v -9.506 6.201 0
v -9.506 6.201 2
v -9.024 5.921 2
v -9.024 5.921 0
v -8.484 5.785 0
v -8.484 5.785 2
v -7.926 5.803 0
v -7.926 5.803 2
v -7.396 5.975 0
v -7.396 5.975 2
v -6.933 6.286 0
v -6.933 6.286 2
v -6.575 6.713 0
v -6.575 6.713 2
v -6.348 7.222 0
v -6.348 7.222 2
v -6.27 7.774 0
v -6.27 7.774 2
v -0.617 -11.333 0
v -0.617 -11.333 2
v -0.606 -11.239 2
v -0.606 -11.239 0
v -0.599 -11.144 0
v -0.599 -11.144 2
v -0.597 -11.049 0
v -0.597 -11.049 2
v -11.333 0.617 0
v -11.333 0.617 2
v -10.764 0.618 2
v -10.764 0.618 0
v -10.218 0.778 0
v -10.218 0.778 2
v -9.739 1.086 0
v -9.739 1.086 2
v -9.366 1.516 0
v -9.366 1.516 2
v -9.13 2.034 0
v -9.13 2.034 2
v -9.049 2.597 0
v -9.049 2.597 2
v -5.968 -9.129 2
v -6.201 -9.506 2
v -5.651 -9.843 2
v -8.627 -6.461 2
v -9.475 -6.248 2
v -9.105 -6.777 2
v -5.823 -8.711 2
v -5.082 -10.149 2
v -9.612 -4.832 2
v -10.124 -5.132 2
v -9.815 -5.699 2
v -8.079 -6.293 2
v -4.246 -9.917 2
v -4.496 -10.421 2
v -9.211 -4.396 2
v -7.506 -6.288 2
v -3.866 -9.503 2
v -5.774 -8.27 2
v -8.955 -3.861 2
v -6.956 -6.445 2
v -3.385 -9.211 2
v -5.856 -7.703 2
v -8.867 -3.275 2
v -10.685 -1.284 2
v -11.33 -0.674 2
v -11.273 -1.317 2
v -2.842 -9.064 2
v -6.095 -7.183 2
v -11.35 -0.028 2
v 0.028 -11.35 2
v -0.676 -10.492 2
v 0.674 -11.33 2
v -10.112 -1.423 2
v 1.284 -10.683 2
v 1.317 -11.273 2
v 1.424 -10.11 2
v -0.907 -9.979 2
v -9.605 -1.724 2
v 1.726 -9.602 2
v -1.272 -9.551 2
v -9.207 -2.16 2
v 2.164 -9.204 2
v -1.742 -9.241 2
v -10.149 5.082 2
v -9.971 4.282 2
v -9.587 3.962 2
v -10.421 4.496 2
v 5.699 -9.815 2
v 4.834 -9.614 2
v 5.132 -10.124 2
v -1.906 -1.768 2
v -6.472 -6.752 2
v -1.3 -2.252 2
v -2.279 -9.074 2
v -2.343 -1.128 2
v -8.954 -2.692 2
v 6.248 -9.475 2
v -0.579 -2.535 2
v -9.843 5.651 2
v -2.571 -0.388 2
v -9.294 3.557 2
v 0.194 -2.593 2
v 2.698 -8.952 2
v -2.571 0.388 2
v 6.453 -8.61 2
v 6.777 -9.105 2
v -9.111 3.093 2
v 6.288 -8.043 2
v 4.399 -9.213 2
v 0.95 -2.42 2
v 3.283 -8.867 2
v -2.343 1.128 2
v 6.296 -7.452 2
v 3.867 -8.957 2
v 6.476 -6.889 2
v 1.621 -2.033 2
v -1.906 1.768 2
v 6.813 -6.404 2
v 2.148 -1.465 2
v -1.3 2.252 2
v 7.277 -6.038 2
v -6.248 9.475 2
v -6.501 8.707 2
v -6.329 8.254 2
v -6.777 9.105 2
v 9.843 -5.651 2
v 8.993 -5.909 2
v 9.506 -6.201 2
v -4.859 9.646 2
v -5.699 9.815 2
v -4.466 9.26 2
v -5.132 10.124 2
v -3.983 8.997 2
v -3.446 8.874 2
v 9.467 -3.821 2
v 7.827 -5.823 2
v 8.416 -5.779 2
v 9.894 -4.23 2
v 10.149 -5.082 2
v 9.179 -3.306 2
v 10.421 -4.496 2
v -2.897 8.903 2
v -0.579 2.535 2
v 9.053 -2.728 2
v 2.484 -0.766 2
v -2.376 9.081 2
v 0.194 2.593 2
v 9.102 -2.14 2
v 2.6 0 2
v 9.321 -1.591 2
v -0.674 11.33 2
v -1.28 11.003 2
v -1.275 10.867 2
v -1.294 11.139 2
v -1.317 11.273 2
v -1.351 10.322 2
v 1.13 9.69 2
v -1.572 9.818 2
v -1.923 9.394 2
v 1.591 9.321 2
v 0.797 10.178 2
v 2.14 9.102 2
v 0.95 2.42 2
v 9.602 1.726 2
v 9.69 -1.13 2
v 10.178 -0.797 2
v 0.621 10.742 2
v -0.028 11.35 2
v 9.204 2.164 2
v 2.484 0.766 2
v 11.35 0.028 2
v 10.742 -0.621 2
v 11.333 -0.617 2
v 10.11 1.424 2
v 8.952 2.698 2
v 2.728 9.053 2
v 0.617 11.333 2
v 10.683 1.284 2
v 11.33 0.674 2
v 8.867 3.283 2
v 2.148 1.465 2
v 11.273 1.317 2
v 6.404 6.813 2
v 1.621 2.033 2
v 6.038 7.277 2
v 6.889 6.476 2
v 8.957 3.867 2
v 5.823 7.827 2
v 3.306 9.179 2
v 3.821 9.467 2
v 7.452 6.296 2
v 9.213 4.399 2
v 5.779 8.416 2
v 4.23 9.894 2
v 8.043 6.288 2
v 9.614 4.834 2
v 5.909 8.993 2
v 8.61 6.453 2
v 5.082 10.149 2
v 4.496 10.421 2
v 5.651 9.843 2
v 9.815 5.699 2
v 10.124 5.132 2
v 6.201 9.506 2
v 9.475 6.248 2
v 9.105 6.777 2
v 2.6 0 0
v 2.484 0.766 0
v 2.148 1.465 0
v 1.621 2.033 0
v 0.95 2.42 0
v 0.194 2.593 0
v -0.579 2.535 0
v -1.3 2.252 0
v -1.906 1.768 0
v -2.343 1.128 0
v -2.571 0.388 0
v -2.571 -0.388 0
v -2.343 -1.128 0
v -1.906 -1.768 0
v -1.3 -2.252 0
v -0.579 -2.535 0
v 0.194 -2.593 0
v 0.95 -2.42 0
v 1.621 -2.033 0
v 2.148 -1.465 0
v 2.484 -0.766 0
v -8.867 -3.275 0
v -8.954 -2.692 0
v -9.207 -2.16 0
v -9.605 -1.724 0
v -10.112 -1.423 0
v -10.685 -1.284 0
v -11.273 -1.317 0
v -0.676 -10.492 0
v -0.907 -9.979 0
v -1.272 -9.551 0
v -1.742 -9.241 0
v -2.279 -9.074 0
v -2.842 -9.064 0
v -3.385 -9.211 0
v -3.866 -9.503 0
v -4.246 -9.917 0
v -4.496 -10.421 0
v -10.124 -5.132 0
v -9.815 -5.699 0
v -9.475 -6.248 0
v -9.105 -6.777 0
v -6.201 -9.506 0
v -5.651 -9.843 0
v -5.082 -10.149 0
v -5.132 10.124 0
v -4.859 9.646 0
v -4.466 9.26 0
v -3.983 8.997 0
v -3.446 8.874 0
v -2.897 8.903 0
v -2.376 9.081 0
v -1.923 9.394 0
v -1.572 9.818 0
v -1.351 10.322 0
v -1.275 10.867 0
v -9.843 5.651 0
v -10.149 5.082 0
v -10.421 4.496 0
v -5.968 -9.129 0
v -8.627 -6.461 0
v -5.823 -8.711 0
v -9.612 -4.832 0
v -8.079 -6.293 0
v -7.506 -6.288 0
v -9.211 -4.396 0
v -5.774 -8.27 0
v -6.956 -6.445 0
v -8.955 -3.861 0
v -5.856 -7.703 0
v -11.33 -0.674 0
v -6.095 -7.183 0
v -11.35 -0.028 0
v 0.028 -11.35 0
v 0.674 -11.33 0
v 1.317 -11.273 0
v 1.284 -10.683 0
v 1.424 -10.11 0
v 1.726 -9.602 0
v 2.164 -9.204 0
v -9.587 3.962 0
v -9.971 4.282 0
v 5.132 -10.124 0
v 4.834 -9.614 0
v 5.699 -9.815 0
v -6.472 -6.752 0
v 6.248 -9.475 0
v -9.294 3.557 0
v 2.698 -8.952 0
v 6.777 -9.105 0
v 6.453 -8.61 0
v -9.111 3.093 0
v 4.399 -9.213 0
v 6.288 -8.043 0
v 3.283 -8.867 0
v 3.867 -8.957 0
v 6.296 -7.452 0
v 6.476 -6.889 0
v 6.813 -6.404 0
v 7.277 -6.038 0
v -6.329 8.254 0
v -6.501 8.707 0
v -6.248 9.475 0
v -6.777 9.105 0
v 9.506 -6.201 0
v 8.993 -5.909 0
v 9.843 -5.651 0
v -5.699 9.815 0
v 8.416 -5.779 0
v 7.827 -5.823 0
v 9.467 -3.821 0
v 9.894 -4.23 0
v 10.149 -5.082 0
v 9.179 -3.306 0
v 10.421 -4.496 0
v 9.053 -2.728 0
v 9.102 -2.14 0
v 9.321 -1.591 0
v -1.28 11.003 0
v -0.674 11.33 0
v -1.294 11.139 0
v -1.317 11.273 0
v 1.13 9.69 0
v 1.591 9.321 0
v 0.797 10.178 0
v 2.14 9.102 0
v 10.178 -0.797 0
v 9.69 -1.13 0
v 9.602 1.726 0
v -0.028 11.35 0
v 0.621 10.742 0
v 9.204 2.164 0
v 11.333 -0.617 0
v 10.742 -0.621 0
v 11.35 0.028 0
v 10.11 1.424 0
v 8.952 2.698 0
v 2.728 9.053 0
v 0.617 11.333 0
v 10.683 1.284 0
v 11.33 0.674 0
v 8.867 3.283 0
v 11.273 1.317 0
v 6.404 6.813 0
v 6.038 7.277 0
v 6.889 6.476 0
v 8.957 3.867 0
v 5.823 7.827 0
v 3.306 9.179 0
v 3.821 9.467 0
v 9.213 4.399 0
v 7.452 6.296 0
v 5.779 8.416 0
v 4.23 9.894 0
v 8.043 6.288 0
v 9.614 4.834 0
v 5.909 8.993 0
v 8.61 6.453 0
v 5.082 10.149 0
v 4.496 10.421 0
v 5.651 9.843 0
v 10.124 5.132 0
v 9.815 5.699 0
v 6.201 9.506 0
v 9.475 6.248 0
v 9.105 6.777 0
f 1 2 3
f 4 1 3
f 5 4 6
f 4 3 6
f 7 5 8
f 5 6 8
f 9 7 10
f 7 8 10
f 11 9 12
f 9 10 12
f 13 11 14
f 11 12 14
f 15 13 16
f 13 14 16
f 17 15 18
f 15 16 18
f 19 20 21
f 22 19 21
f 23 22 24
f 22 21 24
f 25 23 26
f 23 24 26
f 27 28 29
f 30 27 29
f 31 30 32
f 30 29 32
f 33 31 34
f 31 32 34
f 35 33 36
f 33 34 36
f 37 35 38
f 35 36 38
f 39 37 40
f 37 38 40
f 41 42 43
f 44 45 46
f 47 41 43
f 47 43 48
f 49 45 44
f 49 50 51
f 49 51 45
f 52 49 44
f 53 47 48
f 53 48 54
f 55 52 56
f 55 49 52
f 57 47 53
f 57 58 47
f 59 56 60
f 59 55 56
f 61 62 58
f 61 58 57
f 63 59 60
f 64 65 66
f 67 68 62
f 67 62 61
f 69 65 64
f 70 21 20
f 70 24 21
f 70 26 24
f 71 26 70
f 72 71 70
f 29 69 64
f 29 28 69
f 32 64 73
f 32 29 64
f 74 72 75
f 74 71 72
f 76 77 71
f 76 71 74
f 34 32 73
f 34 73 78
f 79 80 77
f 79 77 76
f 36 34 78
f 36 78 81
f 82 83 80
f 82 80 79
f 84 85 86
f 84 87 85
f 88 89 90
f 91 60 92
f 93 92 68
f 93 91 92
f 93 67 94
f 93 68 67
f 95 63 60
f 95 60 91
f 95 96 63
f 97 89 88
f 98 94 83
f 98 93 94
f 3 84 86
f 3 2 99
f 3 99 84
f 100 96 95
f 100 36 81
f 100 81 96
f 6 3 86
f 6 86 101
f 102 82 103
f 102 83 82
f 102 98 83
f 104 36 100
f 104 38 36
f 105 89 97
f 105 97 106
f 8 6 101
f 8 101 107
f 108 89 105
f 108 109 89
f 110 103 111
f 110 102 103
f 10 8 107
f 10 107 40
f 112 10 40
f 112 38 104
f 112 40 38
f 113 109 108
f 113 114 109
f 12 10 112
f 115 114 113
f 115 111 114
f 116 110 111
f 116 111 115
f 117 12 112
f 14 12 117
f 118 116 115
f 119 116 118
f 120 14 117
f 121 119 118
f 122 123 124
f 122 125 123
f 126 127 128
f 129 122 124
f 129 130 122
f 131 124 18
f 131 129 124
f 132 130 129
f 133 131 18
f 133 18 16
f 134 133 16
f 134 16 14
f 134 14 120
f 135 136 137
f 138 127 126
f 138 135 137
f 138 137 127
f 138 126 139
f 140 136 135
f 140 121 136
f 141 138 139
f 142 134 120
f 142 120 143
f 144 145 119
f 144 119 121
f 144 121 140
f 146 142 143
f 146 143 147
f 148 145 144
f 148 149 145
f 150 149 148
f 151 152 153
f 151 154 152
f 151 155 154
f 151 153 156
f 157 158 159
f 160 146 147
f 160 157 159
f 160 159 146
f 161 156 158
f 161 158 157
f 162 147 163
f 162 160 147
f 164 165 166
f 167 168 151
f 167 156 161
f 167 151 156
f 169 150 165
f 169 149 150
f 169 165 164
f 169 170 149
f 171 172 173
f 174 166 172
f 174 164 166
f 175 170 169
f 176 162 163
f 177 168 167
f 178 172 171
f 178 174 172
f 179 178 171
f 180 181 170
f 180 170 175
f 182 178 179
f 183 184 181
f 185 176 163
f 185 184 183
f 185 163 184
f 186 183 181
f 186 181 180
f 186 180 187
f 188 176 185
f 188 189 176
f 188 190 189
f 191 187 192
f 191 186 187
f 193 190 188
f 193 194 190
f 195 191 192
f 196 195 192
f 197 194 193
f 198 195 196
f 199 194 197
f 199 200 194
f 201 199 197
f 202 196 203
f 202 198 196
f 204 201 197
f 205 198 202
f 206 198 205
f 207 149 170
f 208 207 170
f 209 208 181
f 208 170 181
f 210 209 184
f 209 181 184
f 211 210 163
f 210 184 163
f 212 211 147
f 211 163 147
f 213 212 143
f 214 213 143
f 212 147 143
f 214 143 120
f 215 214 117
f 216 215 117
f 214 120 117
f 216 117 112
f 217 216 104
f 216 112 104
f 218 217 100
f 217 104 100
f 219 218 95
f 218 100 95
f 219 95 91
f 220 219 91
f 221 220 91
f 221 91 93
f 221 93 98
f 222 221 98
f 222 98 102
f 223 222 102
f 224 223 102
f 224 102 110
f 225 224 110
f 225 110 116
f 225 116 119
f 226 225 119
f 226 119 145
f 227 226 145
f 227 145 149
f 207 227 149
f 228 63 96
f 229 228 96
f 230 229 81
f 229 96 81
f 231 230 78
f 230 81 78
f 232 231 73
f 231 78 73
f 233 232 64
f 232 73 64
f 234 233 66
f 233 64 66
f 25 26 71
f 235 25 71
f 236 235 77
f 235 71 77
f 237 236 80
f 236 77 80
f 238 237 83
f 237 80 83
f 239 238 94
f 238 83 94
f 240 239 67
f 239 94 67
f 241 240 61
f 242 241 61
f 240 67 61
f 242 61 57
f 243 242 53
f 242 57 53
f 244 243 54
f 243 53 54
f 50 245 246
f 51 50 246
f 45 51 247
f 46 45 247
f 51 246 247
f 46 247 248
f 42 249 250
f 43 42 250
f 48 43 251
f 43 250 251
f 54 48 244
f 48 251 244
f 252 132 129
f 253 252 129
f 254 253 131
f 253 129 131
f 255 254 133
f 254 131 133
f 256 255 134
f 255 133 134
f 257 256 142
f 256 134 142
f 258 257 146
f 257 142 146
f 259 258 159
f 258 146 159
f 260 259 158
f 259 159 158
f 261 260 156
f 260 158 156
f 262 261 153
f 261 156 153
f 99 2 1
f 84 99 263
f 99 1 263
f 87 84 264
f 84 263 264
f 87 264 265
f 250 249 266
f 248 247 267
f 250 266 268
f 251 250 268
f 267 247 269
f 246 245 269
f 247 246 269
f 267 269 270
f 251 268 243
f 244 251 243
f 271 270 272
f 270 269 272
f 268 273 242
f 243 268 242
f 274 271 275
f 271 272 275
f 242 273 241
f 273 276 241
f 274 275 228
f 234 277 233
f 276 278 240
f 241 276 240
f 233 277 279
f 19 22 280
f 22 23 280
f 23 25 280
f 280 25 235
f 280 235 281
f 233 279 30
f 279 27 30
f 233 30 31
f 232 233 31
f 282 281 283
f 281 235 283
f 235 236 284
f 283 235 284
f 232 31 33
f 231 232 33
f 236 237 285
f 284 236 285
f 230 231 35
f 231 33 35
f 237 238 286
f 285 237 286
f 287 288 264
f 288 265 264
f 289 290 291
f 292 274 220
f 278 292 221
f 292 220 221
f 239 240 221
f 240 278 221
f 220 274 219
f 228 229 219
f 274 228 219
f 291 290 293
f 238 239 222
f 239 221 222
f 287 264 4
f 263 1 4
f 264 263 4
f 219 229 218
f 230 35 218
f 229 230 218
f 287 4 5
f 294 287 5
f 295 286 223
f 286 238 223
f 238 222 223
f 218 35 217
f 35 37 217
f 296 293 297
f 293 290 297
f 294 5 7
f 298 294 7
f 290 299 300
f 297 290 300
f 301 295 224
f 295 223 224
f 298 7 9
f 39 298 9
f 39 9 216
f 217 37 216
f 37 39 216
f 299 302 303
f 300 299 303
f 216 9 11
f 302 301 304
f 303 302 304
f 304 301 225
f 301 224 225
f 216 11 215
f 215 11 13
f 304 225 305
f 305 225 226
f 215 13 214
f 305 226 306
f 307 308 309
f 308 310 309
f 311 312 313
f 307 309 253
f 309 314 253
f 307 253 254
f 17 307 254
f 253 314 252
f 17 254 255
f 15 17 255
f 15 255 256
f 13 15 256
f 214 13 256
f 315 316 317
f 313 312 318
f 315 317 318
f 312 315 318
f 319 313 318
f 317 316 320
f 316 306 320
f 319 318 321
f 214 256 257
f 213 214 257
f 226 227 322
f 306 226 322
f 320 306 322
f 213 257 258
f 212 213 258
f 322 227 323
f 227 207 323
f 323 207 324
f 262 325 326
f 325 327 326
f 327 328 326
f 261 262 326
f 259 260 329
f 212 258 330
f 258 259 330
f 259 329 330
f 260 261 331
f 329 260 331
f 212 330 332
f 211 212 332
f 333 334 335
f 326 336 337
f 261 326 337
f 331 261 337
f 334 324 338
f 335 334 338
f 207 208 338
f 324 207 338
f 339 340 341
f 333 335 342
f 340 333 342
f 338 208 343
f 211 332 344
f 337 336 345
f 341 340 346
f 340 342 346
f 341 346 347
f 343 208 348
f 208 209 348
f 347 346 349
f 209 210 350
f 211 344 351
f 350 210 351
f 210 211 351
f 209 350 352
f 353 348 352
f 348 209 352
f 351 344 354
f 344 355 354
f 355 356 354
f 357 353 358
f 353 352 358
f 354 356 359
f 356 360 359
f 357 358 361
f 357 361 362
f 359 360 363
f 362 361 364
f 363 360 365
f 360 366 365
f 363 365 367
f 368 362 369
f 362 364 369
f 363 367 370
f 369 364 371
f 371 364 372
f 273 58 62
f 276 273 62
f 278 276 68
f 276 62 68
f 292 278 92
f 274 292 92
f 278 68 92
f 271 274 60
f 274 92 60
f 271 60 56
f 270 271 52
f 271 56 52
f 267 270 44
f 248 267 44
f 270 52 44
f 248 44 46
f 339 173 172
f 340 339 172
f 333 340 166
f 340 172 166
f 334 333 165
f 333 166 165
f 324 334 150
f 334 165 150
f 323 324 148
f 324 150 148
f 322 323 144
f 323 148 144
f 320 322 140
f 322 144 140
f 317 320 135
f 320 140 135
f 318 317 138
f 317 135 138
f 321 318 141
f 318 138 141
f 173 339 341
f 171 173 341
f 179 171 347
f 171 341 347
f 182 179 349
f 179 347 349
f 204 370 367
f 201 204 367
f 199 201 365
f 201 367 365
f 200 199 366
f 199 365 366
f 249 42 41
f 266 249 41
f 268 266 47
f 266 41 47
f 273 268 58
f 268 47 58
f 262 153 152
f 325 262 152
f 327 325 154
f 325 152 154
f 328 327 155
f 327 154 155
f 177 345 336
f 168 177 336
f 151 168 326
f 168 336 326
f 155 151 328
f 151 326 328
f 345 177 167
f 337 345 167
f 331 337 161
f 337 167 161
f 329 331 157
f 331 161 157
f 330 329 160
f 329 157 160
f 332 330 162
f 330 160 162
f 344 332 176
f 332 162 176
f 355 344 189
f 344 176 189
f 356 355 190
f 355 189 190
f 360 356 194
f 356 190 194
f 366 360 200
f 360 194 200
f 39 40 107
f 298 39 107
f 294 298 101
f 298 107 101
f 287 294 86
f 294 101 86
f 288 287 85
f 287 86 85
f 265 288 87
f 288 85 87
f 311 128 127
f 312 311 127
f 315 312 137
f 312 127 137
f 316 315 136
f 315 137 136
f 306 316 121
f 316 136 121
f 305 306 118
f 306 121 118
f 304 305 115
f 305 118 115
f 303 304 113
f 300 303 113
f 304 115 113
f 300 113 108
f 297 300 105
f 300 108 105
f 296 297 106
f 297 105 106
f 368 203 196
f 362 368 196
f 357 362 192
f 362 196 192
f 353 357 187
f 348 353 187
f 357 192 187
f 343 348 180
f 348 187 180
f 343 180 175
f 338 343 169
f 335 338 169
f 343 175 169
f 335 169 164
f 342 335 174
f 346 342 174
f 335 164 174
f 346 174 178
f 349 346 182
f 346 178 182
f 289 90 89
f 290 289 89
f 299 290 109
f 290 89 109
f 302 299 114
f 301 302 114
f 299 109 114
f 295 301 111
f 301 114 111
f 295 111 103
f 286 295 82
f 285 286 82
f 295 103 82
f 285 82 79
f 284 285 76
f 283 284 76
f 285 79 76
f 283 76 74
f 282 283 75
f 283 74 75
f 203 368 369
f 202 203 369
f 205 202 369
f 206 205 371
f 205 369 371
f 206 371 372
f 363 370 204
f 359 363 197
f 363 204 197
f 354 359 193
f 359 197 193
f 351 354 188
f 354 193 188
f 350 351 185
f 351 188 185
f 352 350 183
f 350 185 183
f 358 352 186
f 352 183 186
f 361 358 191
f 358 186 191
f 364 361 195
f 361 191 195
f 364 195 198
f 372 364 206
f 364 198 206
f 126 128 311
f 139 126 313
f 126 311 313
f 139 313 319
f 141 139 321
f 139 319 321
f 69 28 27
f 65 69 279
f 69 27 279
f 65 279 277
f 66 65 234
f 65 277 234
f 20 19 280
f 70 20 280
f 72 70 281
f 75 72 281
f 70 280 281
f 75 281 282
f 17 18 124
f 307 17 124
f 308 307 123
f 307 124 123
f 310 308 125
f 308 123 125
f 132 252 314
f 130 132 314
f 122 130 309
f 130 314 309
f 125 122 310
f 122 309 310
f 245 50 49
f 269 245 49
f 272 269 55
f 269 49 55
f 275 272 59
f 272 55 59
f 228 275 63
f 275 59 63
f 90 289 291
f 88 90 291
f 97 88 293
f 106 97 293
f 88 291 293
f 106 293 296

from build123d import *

# Parameters (mm, degrees)
F0_R     = 11.35
F1_DEPTH = 2
F2_R     = 2.6
F3_DEPTH = 25


# Not quite as in the source:
# - a feature names something its author has since deleted; it is built from what else it names


with BuildPart() as f1:
    # F0 (on Top) → F1 (new body)
    with BuildSketch(Plane.XY):
        Circle(F0_R)
    extrude(amount=F1_DEPTH)

    # F2 (on face) → F3 (cut)
    with BuildSketch(Plane.XY.offset(2)):
        with BuildLine():
            ThreePointArc((9.1045560576, 6.7771350137), (7.7736409673, 8.2700064155), (6.2013506213, 9.506090178))
            ThreePointArc((6.2013506213, 9.506090178), (6.4038363916, 6.8127365625), (9.1045560576, 6.7771350137))
        make_face()
        with BuildLine():
            ThreePointArc((9.1045560576, 6.7771350137), (9.5987204424, 7.4520303097), (9.7736409673, 8.2700064155))
            ThreePointArc((9.7736409673, 8.2700064155), (8.4276361156, 10.1600567709), (6.2013506213, 9.506090178))
            ThreePointArc((6.2013506213, 9.506090178), (7.7736409673, 8.2700064155), (9.1045560576, 6.7771350137))
        make_face()
        with BuildLine():
            ThreePointArc((0.6174820868, 11.3331908954), (2.1395167155, 9.1019211282), (4.4962093293, 10.4214491155))
            ThreePointArc((4.4962093293, 10.4214491155), (2.5971673498, 11.0488561289), (0.6174820868, 11.3331908954))
        make_face()
        with BuildLine():
            ThreePointArc((0.6174820868, 11.3331908954), (2.5971673498, 11.0488561289), (4.4962093293, 10.4214491155))
            ThreePointArc((4.4962093293, 10.4214491155), (4.5717665445, 10.73111721), (4.5971673498, 11.0488561289))
            ThreePointArc((4.5971673498, 11.0488561289), (2.7396971257, 13.04377098), (0.6174820868, 11.3331908954))
        make_face()
        with BuildLine():
            ThreePointArc((-5.1318402741, 10.1235722648), (-3.2752151616, 10.8671737653), (-1.3168930579, 11.2733443429))
            ThreePointArc((-1.3168930579, 11.2733443429), (-3.8523455866, 12.7820942526), (-5.1318402741, 10.1235722648))
        make_face()
        with BuildLine():
            ThreePointArc((-1.2752151616, 10.8671737653), (-1.2856619194, 11.0713254155), (-1.3168930579, 11.2733443429))
            ThreePointArc((-1.3168930579, 11.2733443429), (-3.2752151616, 10.8671737653), (-5.1318402741, 10.1235722648))
            ThreePointArc((-5.1318402741, 10.1235722648), (-2.8965663963, 8.9033445689), (-1.2752151616, 10.8671737653))
        make_face()
        with BuildLine():
            ThreePointArc((-9.506090178, 6.2013506213), (-8.2700064155, 7.7736409673), (-6.7771350137, 9.1045560576))
            ThreePointArc((-6.7771350137, 9.1045560576), (-9.7272762684, 9.143445543), (-9.506090178, 6.2013506213))
        make_face()
        with BuildLine():
            ThreePointArc((-6.2700064155, 7.7736409673), (-6.4010838912, 8.4857705891), (-6.7771350137, 9.1045560576))
            ThreePointArc((-6.7771350137, 9.1045560576), (-8.2700064155, 7.7736409673), (-9.506090178, 6.2013506213))
            ThreePointArc((-9.506090178, 6.2013506213), (-7.3959833966, 5.97472914), (-6.2700064155, 7.7736409673))
        make_face()
        with BuildLine():
            ThreePointArc((-11.3331908954, 0.6174820868), (-11.0488561289, 2.5971673498), (-10.4214491155, 4.4962093293))
            ThreePointArc((-10.4214491155, 4.4962093293), (-12.9957911296, 3.0548179842), (-11.3331908954, 0.6174820868))
        make_face()
        with BuildLine():
            ThreePointArc((-9.0488561289, 2.5971673498), (-9.427928304, 3.7687444863), (-10.4214491155, 4.4962093293))
            ThreePointArc((-10.4214491155, 4.4962093293), (-11.0488561289, 2.5971673498), (-11.3331908954, 0.6174820868))
            ThreePointArc((-11.3331908954, 0.6174820868), (-9.7390220808, 1.0857657597), (-9.0488561289, 2.5971673498))
        make_face()
        with BuildLine():
            ThreePointArc((11.2733443429, 1.3168930579), (10.8671737653, 3.2752151616), (10.1235722648, 5.1318402741))
            ThreePointArc((10.1235722648, 5.1318402741), (8.952253278, 2.6980847366), (11.2733443429, 1.3168930579))
        make_face()
        with BuildLine():
            ThreePointArc((12.8671737653, 3.2752151616), (11.9880655975, 4.9315972131), (10.1235722648, 5.1318402741))
            ThreePointArc((10.1235722648, 5.1318402741), (10.8671737653, 3.2752151616), (11.2733443429, 1.3168930579))
            ThreePointArc((11.2733443429, 1.3168930579), (12.4183573707, 2.0127455887), (12.8671737653, 3.2752151616))
        make_face()
        with BuildLine():
            ThreePointArc((10.4214491155, -4.4962093293), (11.0488561289, -2.5971673498), (11.3331908954, -0.6174820868))
            ThreePointArc((11.3331908954, -0.6174820868), (9.1019211282, -2.1395167155), (10.4214491155, -4.4962093293))
        make_face()
        with BuildLine():
            ThreePointArc((13.0488561289, -2.5971673498), (12.560257719, -1.2873333018), (11.3331908954, -0.6174820868))
            ThreePointArc((11.3331908954, -0.6174820868), (11.0488561289, -2.5971673498), (10.4214491155, -4.4962093293))
            ThreePointArc((10.4214491155, -4.4962093293), (12.2204332653, -4.2180951747), (13.0488561289, -2.5971673498))
        make_face()
        with BuildLine():
            ThreePointArc((-4.4962093293, -10.4214491155), (-3.0548179842, -12.9957911296), (-0.6174820868, -11.3331908954))
            ThreePointArc((-0.6174820868, -11.3331908954), (-2.5971673498, -11.0488561289), (-4.4962093293, -10.4214491155))
        make_face()
        with BuildLine():
            ThreePointArc((-4.4962093293, -10.4214491155), (-2.5971673498, -11.0488561289), (-0.6174820868, -11.3331908954))
            ThreePointArc((-0.6174820868, -11.3331908954), (-0.6022524988, -11.1913859047), (-0.5971673498, -11.0488561289))
            ThreePointArc((-0.5971673498, -11.0488561289), (-2.2794284309, -9.0742569343), (-4.4962093293, -10.4214491155))
        make_face()
        with BuildLine():
            ThreePointArc((-10.1235722648, -5.1318402741), (-10.8671737653, -3.2752151616), (-11.2733443429, -1.3168930579))
            ThreePointArc((-11.2733443429, -1.3168930579), (-12.7820942526, -3.8523455866), (-10.1235722648, -5.1318402741))
        make_face()
        with BuildLine():
            ThreePointArc((-8.8671737653, -3.2752151616), (-9.6047041924, -1.7240315562), (-11.2733443429, -1.3168930579))
            ThreePointArc((-11.2733443429, -1.3168930579), (-10.8671737653, -3.2752151616), (-10.1235722648, -5.1318402741))
            ThreePointArc((-10.1235722648, -5.1318402741), (-9.2107917138, -4.3961069938), (-8.8671737653, -3.2752151616))
        make_face()
        with BuildLine():
            ThreePointArc((-6.2013506213, -9.506090178), (-7.7736409673, -8.2700064155), (-9.1045560576, -6.7771350137))
            ThreePointArc((-9.1045560576, -6.7771350137), (-9.143445543, -9.7272762684), (-6.2013506213, -9.506090178))
        make_face()
        with BuildLine():
            ThreePointArc((-5.7736409673, -8.2700064155), (-6.9556648615, -6.4449269404), (-9.1045560576, -6.7771350137))
            ThreePointArc((-9.1045560576, -6.7771350137), (-7.7736409673, -8.2700064155), (-6.2013506213, -9.506090178))
            ThreePointArc((-6.2013506213, -9.506090178), (-5.8835906119, -8.9240015638), (-5.7736409673, -8.2700064155))
        make_face()
        with BuildLine():
            ThreePointArc((6.7771350137, -9.1045560576), (8.2700064155, -7.7736409673), (9.506090178, -6.2013506213))
            ThreePointArc((9.506090178, -6.2013506213), (6.8127365625, -6.4038363916), (6.7771350137, -9.1045560576))
        make_face()
        with BuildLine():
            ThreePointArc((10.2700064155, -7.7736409673), (10.0689182428, -6.8996179484), (9.506090178, -6.2013506213))
            ThreePointArc((9.506090178, -6.2013506213), (8.2700064155, -7.7736409673), (6.7771350137, -9.1045560576))
            ThreePointArc((6.7771350137, -9.1045560576), (8.9821360372, -9.6425634916), (10.2700064155, -7.7736409673))
        make_face()
        with BuildLine():
            ThreePointArc((1.3168930579, -11.2733443429), (3.2752151616, -10.8671737653), (5.1318402741, -10.1235722648))
            ThreePointArc((5.1318402741, -10.1235722648), (2.6980847366, -8.952253278), (1.3168930579, -11.2733443429))
        make_face()
        with BuildLine():
            ThreePointArc((5.2752151616, -10.8671737653), (5.239044358, -10.488525), (5.1318402741, -10.1235722648))
            ThreePointArc((5.1318402741, -10.1235722648), (3.2752151616, -10.8671737653), (1.3168930579, -11.2733443429))
            ThreePointArc((1.3168930579, -11.2733443429), (3.4793668118, -12.8567270075), (5.2752151616, -10.8671737653))
        make_face()
        Circle(F2_R)
    extrude(amount=-F3_DEPTH, mode=Mode.SUBTRACT)


solid = f1.part
